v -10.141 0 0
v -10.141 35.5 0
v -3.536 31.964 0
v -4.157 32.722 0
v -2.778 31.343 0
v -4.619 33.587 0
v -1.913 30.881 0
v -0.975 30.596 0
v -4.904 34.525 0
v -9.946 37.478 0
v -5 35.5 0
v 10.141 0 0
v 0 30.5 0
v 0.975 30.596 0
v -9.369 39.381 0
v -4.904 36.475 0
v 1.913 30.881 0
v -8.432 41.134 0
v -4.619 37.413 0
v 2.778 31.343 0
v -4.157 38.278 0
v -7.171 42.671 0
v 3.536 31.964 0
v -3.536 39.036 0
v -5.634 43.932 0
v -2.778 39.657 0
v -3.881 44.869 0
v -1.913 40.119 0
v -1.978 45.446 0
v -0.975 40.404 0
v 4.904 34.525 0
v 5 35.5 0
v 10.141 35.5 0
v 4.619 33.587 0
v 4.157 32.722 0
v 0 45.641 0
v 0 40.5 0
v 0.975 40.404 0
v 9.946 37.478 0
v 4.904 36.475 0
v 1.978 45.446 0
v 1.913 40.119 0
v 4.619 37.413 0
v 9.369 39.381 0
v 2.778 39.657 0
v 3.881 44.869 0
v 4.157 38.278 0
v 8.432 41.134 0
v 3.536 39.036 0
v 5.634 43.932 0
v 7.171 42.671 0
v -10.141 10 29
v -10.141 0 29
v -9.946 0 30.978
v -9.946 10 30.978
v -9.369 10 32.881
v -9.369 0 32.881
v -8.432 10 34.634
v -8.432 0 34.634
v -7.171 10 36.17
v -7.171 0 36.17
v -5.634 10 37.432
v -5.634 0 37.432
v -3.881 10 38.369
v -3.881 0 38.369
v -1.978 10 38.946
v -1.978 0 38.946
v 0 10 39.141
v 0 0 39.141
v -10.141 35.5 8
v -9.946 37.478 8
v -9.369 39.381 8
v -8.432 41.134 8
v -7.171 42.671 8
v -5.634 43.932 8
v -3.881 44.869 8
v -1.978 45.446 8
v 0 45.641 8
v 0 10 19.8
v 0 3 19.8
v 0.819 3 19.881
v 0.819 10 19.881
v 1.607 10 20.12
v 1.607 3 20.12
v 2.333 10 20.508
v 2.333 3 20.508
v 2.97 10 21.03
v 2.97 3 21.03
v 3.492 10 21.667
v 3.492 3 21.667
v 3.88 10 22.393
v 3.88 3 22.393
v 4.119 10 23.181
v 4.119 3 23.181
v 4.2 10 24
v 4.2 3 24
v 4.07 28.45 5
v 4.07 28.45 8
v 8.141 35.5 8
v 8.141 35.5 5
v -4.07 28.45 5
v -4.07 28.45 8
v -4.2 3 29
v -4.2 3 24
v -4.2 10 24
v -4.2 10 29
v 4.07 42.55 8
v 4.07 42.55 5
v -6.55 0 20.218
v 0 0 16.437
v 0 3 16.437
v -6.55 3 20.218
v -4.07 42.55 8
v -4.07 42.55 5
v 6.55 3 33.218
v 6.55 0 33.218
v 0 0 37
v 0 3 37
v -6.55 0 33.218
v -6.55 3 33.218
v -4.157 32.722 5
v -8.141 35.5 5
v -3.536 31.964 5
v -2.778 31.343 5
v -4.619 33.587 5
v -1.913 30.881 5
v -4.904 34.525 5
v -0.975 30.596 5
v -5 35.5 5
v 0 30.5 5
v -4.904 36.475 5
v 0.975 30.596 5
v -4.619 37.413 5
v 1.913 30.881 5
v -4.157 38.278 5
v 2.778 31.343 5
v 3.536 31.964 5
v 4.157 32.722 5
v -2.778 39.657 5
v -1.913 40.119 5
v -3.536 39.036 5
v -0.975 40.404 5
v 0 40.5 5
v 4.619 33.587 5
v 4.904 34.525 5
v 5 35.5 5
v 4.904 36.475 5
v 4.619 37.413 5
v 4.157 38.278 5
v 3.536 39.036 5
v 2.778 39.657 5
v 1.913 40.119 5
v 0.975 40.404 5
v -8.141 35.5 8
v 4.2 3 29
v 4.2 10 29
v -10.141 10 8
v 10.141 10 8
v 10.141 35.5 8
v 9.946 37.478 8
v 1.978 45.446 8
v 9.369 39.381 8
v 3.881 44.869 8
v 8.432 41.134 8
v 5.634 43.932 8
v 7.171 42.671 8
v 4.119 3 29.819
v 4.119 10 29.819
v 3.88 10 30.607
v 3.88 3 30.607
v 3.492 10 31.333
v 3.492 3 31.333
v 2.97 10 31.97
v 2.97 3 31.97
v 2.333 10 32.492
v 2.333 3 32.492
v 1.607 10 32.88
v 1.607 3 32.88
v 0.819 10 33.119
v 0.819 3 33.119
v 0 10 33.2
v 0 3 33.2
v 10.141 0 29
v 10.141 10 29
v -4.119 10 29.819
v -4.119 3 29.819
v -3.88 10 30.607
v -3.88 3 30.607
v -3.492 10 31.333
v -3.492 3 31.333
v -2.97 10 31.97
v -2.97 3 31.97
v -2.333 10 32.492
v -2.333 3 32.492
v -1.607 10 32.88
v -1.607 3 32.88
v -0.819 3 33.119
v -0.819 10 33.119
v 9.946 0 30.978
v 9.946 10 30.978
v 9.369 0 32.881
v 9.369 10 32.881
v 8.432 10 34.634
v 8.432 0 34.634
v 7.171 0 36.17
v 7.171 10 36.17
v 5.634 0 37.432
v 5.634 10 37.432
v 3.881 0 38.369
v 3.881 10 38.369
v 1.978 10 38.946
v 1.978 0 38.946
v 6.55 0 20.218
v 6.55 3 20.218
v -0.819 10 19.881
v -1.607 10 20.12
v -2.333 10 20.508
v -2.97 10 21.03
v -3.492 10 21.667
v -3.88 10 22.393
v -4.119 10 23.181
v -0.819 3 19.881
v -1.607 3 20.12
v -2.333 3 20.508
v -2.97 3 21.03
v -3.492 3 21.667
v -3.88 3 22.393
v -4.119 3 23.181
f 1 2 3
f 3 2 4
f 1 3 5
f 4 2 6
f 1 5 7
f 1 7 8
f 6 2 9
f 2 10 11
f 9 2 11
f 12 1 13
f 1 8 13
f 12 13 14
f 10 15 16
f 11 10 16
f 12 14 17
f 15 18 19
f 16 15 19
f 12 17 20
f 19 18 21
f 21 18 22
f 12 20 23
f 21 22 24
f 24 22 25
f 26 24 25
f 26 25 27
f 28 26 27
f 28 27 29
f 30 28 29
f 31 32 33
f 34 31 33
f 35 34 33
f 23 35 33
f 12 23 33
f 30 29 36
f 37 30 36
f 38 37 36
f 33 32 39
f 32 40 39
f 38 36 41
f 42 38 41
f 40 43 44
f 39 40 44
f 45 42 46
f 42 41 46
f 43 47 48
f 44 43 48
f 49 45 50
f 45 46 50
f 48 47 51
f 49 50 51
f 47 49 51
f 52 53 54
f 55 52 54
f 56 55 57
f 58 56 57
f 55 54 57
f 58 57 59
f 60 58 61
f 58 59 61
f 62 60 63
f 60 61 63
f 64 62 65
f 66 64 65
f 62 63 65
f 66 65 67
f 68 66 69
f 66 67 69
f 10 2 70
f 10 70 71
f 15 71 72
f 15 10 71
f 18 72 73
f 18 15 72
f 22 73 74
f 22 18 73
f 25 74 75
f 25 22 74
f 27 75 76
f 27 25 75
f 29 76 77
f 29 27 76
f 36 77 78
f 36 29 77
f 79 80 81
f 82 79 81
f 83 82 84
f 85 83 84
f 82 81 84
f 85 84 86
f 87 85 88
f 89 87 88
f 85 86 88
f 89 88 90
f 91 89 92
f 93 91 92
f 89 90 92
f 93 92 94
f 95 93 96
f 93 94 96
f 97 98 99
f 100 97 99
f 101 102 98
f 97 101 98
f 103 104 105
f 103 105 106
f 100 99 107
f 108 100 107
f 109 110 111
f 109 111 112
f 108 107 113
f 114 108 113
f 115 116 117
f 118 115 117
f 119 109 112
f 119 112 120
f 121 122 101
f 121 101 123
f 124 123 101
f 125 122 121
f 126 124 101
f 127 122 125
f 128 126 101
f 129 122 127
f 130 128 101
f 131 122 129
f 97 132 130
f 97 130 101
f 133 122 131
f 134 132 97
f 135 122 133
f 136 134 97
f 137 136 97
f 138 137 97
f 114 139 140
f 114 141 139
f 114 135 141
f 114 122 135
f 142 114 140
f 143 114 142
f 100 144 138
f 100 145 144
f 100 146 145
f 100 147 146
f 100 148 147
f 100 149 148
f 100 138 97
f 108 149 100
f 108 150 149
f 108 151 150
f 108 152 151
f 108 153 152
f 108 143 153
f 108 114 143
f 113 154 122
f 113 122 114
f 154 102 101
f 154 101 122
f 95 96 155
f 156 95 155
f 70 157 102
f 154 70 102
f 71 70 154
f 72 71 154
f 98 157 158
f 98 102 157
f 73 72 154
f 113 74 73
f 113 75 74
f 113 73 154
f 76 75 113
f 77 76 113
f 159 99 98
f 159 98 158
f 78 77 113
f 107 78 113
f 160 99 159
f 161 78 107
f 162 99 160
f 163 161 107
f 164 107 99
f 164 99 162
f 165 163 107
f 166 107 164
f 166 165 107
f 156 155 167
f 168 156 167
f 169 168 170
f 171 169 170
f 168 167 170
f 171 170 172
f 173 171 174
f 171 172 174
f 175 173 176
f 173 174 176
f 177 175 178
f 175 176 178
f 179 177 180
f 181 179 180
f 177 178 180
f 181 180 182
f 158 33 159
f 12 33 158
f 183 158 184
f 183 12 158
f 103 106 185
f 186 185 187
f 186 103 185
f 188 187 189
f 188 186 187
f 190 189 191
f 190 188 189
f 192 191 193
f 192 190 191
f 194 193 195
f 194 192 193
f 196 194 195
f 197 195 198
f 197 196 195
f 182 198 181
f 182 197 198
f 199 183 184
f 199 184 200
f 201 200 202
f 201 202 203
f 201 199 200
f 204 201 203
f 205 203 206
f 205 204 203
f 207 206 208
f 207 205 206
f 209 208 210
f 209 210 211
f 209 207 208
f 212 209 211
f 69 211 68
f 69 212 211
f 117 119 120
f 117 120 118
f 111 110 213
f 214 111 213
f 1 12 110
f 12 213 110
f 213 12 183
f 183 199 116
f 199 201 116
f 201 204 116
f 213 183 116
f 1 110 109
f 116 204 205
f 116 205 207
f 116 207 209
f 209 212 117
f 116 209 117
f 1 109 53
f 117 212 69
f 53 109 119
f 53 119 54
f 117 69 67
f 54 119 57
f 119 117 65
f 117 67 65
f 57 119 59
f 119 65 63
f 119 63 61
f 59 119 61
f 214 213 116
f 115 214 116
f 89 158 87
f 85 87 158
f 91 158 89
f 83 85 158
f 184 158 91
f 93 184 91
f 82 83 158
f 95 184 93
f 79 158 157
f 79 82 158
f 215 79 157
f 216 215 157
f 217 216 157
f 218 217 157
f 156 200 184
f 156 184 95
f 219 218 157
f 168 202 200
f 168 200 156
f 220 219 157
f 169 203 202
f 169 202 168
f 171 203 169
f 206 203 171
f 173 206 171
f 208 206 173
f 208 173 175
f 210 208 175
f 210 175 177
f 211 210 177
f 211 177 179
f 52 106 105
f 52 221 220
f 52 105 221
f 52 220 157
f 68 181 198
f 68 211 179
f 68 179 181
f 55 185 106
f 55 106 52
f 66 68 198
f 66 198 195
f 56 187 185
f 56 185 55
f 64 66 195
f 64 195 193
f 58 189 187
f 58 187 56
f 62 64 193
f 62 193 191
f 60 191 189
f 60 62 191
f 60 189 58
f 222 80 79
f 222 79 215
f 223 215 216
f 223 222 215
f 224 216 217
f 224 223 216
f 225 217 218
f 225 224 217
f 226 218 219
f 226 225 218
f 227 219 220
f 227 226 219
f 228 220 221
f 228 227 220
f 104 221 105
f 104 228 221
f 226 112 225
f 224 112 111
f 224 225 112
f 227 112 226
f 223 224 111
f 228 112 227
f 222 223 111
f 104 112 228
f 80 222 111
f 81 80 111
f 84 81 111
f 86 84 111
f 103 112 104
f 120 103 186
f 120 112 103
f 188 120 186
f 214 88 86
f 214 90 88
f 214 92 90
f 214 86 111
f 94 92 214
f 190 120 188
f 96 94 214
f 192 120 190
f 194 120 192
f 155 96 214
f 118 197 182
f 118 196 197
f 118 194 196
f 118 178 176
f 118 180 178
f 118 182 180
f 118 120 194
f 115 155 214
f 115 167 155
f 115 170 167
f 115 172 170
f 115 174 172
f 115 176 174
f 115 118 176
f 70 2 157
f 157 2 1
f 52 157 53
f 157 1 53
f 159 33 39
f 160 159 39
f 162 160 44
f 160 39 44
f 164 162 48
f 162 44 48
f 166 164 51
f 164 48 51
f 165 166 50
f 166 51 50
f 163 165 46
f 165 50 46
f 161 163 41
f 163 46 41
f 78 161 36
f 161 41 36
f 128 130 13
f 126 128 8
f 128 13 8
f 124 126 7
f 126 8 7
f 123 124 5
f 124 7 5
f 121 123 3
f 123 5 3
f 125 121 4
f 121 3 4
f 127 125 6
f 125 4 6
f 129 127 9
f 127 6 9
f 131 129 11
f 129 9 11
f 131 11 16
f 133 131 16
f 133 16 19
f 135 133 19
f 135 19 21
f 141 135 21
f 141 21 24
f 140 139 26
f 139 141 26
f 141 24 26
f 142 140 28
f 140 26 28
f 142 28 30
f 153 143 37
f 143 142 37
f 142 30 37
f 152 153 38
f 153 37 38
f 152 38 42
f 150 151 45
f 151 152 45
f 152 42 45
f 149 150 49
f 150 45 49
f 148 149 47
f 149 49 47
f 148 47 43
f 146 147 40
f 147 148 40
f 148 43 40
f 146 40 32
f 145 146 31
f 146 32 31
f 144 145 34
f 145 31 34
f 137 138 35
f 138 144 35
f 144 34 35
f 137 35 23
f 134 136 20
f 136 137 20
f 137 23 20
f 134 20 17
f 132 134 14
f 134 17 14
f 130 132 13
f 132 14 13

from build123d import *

# Parameters (mm, degrees)
PAD_DEPTH       = 8
PAD001_DEPTH    = 10
POCKET_DEPTH    = 3
POCKET001_DEPTH = 3


with BuildPart() as part:
    # Sketch → Pad (new body)
    with BuildSketch(Plane.XY):
        with BuildLine():
            ThreePointArc((0, 30.5), (5, 35.5), (0, 40.5))
            Line((0, 40.5), (0, 45.640639))
            ThreePointArc((10.140639, 35.499973), (7.170524, 42.670505), (0, 45.640639))
            Line((10.140639, 35.499973), (10.140639, 0))
            Line((0, 0), (10.140639, 0))
            Line((0, 30.5), (0, 0))
        make_face()
    pad = extrude(amount=PAD_DEPTH)

    # Sketch001 (on Face6 of Pad) → Pad001 (join)
    with BuildSketch(Plane.XZ):
        with BuildLine():
            ThreePointArc((10.140639, 28.999961), (7.170518, 36.170482), (0, 39.14061))
            Line((0, 39.14061), (0, 33.199971))
            ThreePointArc((4.2, 28.999985), (2.969843, 31.969824), (0, 33.199971))
            Line((4.2, 23.999985), (4.2, 28.999985))
            ThreePointArc((0, 19.8), (2.969843, 21.030146), (4.2, 23.999985))
            Line((0, 19.8), (0, 8))
            Line((0, 8), (10.140639, 8))
            Line((10.140639, 8), (10.140639, 28.999961))
        make_face()
    pad001 = extrude(amount=-PAD001_DEPTH)

    # Sketch002 (on Face9 of Pad001) → Pocket (cut)
    with BuildSketch(Plane.XZ):
        Polygon((0, 16.436711), (6.55, 20.218356), (6.55, 33.218356), (0, 37), align=None)
    pocket = extrude(amount=-POCKET_DEPTH, mode=Mode.SUBTRACT)

    # Sketch003 (on Face5 of Pocket) → Pocket001 (cut)
    with BuildSketch(Plane.XY.offset(8)):
        Polygon((4.070319, 28.45), (8.140639, 35.5), (4.070319, 42.55), (0, 42.55), (0, 28.45), align=None)
    pocket001 = extrude(amount=-POCKET001_DEPTH, mode=Mode.SUBTRACT)

    # Mirrored: Pad, Pad001, Pocket, Pocket001 across Sketch V_Axis
    add(pad.mirror(Plane(origin=(0, 0, 0), x_dir=(0, 0, 1), z_dir=(1, 0, 0))))
    add(pad001.mirror(Plane(origin=(0, 0, 0), x_dir=(0, 0, 1), z_dir=(1, 0, 0))))
    add(pocket.mirror(Plane(origin=(0, 0, 0), x_dir=(0, 0, 1), z_dir=(1, 0, 0))), mode=Mode.SUBTRACT)
    add(pocket001.mirror(Plane(origin=(0, 0, 0), x_dir=(0, 0, 1), z_dir=(1, 0, 0))), mode=Mode.SUBTRACT)


solid = part.part
